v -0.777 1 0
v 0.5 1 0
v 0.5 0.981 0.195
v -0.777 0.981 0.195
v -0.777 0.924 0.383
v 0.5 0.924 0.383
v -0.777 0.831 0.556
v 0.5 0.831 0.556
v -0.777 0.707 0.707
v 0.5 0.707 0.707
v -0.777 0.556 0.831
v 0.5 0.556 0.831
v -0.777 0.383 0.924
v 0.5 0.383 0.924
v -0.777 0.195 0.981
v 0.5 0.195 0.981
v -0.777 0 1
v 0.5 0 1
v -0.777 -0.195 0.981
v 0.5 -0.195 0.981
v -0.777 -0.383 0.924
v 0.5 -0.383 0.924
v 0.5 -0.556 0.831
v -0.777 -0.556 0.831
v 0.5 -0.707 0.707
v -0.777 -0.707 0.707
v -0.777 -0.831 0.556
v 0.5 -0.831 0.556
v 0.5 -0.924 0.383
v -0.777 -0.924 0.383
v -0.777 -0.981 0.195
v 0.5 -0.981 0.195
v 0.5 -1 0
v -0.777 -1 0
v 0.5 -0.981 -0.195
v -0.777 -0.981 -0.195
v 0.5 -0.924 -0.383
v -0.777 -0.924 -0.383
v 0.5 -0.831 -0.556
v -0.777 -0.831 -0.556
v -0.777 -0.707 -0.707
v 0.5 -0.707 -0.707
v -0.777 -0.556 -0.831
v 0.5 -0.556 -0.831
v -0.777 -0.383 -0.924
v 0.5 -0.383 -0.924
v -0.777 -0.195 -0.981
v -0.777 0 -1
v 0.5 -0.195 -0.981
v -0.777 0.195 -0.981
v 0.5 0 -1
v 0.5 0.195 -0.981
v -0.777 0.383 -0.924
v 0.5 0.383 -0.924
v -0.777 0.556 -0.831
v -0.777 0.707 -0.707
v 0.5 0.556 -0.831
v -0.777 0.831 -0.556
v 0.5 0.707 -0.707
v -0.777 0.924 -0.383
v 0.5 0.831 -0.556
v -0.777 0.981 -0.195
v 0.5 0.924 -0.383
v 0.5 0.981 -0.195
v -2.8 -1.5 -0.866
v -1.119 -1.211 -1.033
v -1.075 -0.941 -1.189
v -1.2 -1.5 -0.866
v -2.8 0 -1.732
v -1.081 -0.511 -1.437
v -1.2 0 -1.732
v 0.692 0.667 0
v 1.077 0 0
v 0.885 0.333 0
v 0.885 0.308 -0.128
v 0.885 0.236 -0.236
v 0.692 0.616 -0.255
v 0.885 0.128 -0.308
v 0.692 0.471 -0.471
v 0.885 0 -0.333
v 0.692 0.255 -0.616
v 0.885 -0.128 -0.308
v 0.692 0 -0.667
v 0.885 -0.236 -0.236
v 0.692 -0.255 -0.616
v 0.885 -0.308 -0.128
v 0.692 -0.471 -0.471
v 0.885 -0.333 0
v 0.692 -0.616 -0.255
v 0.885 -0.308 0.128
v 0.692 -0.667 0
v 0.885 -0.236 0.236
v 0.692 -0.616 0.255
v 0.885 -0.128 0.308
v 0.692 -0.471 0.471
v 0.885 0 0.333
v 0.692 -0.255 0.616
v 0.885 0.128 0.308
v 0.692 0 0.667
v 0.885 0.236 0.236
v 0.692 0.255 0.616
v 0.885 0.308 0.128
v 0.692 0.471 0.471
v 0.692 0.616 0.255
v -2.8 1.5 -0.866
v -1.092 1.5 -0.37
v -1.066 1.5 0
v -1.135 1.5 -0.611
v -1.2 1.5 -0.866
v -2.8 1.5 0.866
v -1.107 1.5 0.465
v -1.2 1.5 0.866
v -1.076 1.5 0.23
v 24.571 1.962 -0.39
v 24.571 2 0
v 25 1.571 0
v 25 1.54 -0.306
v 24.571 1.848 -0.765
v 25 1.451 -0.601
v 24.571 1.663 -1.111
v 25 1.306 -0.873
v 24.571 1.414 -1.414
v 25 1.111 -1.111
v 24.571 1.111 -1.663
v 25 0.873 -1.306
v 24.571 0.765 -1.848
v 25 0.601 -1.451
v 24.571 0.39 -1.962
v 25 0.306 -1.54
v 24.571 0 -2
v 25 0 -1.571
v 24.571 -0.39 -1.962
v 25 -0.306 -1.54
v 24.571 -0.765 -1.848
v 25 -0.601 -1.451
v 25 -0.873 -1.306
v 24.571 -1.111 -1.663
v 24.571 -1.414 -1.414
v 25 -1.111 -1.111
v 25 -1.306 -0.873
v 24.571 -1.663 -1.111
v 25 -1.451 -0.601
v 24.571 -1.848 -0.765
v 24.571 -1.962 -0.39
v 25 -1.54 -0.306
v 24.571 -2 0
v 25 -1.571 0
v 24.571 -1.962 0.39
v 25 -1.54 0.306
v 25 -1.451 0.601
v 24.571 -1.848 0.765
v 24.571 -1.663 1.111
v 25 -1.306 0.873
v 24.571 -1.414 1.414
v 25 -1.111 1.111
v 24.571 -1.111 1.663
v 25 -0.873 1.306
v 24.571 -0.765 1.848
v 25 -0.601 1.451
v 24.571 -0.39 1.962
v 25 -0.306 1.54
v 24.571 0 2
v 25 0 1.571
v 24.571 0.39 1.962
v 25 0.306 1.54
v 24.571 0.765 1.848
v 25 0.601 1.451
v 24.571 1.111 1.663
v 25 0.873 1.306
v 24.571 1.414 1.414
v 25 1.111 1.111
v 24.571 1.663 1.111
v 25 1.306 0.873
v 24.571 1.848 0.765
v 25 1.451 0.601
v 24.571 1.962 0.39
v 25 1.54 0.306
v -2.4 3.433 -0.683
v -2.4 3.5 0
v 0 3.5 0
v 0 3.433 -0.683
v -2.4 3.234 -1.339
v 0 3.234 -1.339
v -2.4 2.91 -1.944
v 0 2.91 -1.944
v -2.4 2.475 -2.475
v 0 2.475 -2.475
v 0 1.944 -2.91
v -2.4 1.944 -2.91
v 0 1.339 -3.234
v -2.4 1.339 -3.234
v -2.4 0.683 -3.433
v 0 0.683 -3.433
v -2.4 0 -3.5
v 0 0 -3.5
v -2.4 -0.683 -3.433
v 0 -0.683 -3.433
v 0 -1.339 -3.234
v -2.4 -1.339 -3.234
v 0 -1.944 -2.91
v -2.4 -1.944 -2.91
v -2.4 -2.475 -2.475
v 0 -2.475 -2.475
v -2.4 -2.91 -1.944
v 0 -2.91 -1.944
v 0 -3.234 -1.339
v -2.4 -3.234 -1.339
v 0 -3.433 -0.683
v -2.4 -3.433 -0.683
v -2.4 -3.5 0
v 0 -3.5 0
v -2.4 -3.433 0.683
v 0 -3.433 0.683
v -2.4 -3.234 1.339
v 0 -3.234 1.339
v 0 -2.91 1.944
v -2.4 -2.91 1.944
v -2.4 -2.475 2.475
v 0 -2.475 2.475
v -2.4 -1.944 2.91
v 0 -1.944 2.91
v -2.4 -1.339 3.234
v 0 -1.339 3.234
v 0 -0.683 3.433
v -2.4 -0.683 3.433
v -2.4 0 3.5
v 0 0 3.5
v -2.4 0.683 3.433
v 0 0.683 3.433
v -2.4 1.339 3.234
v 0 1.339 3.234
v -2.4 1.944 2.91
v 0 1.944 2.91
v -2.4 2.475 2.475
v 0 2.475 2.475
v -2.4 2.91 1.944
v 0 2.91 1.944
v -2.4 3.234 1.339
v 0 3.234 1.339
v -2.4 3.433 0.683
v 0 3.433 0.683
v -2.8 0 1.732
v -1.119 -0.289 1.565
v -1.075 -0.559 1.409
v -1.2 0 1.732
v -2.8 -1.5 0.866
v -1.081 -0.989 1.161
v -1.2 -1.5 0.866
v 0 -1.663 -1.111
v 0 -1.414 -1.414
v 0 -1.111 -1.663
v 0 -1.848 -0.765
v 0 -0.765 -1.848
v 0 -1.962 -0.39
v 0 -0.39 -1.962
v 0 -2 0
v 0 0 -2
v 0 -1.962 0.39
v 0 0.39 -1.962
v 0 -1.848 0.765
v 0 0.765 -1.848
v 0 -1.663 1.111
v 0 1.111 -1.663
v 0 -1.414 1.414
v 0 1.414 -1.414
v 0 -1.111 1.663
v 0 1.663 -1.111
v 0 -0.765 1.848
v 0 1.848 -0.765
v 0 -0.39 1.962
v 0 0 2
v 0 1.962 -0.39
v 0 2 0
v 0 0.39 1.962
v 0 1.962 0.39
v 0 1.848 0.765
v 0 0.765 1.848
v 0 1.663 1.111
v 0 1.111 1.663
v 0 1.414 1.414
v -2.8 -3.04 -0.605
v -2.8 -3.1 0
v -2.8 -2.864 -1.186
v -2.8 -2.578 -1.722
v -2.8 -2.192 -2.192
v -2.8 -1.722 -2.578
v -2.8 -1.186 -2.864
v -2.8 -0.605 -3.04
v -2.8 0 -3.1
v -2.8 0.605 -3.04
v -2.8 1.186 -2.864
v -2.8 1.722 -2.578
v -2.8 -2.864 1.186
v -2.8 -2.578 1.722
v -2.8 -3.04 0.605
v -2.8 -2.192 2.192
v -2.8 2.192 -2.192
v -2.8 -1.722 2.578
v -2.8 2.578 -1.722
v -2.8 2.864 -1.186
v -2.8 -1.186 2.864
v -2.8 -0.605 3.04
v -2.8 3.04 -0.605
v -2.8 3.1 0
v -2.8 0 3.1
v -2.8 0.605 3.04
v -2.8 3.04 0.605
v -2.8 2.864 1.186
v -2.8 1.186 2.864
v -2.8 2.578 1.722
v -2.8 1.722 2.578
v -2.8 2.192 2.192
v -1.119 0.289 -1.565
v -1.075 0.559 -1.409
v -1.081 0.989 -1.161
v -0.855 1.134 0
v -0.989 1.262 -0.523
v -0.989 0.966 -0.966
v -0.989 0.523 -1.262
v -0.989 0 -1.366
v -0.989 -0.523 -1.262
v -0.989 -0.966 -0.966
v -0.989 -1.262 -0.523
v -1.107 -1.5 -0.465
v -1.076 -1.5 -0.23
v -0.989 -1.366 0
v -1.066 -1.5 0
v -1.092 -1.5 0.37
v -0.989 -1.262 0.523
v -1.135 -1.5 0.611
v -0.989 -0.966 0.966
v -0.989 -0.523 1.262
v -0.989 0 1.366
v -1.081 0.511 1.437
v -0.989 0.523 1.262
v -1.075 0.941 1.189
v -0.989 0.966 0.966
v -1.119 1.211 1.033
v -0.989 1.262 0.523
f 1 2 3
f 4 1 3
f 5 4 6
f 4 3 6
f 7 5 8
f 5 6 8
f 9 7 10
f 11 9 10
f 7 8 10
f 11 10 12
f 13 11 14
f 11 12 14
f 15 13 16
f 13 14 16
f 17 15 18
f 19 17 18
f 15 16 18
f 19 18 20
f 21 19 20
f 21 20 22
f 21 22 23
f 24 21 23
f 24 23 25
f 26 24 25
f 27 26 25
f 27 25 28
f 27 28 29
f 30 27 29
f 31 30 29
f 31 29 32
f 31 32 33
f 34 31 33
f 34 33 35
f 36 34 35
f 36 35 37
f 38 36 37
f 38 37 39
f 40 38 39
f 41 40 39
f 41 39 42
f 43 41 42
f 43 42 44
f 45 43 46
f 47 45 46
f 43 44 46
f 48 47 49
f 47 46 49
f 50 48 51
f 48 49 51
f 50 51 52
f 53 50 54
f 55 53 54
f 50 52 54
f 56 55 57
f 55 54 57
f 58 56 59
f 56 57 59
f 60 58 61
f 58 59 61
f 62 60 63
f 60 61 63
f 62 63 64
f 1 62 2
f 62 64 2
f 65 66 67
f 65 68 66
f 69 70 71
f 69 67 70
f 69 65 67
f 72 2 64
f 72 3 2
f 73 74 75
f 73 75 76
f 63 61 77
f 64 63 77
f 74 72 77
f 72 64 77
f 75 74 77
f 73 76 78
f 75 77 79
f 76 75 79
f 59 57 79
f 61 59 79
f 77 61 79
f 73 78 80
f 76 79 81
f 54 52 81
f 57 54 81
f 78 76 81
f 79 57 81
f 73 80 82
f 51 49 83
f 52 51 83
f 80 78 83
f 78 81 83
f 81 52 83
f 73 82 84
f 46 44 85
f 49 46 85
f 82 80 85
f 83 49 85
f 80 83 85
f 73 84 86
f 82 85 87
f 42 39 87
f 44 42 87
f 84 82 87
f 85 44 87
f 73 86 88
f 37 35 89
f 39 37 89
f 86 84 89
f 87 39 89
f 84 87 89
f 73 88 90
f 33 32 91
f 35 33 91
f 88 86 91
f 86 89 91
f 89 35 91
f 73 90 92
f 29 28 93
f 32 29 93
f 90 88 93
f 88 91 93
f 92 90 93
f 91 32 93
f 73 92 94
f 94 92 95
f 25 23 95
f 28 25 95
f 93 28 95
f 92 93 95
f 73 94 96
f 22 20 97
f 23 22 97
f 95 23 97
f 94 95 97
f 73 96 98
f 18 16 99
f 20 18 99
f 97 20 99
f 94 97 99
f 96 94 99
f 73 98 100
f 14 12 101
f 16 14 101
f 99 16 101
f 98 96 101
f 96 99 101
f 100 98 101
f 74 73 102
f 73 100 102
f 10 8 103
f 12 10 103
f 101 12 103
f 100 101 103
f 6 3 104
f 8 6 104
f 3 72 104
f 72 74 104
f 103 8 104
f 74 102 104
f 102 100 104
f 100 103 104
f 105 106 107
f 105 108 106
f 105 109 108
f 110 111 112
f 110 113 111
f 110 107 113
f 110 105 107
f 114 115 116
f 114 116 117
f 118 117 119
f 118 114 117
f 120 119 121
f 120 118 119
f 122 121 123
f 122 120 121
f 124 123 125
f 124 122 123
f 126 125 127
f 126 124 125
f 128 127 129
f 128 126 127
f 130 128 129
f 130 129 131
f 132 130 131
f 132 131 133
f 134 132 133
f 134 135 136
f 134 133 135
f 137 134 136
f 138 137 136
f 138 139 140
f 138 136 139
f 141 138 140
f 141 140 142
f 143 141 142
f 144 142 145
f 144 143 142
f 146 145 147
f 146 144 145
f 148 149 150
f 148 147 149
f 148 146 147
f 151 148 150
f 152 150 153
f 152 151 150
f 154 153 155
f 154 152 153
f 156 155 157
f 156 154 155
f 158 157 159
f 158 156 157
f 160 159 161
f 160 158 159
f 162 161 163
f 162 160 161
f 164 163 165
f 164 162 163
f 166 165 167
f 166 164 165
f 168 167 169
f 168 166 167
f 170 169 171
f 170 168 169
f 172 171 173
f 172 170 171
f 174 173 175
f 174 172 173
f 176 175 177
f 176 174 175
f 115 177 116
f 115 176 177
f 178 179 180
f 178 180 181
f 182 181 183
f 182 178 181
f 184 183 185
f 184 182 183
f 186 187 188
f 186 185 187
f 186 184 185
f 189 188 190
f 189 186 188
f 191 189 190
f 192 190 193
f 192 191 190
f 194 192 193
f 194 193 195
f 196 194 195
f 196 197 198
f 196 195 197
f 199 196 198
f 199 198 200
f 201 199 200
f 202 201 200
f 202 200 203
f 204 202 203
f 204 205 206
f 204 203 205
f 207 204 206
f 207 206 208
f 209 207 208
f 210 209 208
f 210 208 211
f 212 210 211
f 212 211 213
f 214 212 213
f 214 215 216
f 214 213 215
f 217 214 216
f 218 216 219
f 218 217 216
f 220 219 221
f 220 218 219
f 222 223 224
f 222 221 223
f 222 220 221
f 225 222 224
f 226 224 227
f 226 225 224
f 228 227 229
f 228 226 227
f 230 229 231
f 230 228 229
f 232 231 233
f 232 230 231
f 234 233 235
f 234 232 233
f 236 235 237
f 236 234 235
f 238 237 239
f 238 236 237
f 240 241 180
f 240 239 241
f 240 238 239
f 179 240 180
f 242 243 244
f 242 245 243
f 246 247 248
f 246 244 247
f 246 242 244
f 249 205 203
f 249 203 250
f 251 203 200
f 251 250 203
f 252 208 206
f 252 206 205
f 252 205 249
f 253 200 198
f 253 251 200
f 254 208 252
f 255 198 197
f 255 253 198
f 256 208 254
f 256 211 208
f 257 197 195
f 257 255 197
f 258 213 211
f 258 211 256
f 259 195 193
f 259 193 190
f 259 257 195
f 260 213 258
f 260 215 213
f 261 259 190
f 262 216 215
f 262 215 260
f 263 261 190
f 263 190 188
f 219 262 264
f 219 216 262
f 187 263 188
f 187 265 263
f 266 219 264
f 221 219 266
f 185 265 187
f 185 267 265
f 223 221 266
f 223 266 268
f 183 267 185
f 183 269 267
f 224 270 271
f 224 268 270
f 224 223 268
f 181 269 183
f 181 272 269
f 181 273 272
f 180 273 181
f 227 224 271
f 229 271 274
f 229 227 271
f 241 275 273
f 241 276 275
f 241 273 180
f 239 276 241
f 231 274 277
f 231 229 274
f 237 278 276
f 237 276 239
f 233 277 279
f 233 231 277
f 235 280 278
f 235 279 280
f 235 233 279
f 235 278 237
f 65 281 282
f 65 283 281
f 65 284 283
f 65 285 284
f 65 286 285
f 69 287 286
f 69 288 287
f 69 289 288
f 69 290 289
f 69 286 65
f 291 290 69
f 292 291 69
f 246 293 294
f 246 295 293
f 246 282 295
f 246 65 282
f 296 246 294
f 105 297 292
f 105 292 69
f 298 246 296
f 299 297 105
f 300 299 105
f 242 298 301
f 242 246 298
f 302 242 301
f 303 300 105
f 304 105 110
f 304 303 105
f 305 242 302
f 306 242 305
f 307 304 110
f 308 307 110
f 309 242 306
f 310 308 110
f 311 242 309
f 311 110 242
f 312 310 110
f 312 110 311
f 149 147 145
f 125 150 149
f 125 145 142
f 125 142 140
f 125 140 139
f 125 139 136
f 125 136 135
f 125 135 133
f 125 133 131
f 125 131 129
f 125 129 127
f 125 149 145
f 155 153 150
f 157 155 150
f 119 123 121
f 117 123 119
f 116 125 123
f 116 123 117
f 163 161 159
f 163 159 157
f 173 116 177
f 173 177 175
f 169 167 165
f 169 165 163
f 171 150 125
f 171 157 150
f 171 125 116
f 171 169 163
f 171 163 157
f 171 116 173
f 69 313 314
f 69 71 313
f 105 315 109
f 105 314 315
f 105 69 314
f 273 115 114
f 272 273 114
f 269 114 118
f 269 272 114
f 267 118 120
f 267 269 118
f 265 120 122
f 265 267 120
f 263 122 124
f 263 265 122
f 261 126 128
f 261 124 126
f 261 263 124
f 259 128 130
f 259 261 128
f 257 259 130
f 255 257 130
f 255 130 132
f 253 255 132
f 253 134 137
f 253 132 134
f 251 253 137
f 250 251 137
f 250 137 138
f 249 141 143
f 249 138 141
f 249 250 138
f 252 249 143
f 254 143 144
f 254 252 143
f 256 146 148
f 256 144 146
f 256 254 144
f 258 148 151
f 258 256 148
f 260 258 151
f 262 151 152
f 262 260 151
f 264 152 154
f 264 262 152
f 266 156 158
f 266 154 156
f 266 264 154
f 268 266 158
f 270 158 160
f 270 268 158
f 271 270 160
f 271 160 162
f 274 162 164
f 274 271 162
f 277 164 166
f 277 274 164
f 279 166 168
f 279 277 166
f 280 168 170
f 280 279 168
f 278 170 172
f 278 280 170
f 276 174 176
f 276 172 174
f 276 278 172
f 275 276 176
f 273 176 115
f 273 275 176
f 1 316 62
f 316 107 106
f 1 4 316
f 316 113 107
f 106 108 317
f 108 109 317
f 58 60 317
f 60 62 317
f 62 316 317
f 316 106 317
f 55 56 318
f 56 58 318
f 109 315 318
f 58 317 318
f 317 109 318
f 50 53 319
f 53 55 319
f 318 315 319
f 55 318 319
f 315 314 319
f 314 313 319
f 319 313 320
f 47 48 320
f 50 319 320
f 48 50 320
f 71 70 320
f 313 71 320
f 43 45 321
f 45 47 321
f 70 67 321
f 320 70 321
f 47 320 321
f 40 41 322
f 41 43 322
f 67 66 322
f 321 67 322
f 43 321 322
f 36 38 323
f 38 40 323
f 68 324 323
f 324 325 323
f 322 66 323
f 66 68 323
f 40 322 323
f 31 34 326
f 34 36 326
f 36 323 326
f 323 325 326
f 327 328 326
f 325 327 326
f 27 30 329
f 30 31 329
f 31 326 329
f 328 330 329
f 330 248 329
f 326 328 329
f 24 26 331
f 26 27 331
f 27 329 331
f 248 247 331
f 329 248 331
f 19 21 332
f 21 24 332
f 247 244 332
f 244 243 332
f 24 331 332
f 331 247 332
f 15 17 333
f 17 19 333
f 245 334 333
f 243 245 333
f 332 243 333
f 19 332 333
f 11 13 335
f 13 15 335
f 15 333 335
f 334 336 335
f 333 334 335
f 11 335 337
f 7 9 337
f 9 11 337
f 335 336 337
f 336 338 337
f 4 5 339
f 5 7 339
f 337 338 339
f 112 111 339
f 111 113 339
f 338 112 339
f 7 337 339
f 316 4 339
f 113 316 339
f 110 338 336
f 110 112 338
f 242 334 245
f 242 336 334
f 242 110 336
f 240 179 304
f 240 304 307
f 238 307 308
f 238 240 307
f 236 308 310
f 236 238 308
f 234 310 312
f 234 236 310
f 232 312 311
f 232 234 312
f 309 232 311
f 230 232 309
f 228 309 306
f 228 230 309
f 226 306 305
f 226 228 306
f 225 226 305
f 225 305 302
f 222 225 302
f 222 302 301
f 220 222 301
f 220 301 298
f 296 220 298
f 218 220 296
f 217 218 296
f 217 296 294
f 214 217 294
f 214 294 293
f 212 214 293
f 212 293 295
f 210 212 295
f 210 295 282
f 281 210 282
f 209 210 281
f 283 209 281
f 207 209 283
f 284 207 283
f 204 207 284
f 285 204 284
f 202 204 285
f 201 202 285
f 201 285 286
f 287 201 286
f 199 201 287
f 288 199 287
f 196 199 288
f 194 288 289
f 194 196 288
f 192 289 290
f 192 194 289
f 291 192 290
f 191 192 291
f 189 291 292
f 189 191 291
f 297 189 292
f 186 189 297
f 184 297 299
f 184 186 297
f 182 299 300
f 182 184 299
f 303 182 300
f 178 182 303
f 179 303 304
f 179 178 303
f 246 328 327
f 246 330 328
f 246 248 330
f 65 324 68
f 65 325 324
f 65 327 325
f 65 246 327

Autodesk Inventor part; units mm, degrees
ref_plane "YZ Plane" through (0, 0, 0) normal (1, 0, 0) x (0, 1, 0)
ref_plane "XZ Plane" through (0, 0, 0) normal (0, 1, 0) x (-1, 0, 0)
sketch "Sketch1" plane through (0, 0, 0) normal (0, 0, 1) x (1, 0, 0)
  line L0 (1.0774, 0) -> (25, 0)
  line L1 (25, 0) -> (25, 2)
  line L2 (25, 2) -> (0, 2)
  line L3 (0, 2) -> (0, 3.5)
  line L4 (0, 3.5) -> (-2.8, 3.5)
  line L5 (-2.8, 3.5) -> (-2.8, 1.7321)
  line L6 (-2.8, 1.7321) -> (-1.2, 1.7321)
  line L7 (-1.2, 1.7321) -> (-0.7774, 1)
  line L8 (-8.36, 0) -> (30.56, 0) projected
  line L9 (0, -0.7) -> (0, 4.2) projected
  line L10 (-0.7774, 1) -> (0.5, 1)
  line L11 (0.5, 1) -> (1.0774, 0)
  line L12 (-2.8, 1.7321) -> (-2.8, 0) construction
  line L13 (-2.8, 3.1) -> (-2.4, 3.5)
  dimension "d0" = 2.8
  dimension "d1" = 1.6
  dimension "d2" = 60
  dimension "d3" = 4
  dimension "d4" = 3.4641
  dimension "d5" = 7
  dimension "d15" = 3.3
  dimension "d16" = 2
  dimension "d17" = 25
  dimension "d32" = 45
  dimension "d33" = 0.4
revolve "Body" add sketch "Sketch1" angle 360 about axis through (1.0774, 0, 0) along (1, 0, 0) contours L11 L10 L9 L2 L1 L0 | L10 L7 L6 L5 L13 L4 L3 L9 | L13 L5 L4
revolve "Chamfer2" cut sketch "Sketch1" angle 360 about axis through (-10, 0, 0) along (1, 0, 0) contours L13 L5 L4
sketch "Sketch2" plane through (-2.8, 0, 0) normal (-1, 0, 0) x (0, 0, 1)
  circle A0 centre (0, 0) radius 1.7321 projected
  line L0 (0, -4.9) -> (0, 4.9) projected
  line L1 (-4.9, 0) -> (4.9, 0) projected
  line L2 (1.7321, 0) -> (0.866, -1.5)
  line L3 (0.866, -1.5) -> (-0.866, -1.5)
  line L4 (-0.866, -1.5) -> (-1.7321, 0)
  line L5 (-1.7321, 0) -> (-0.866, 1.5)
  line L6 (-0.866, 1.5) -> (0.866, 1.5)
  line L7 (0.866, 1.5) -> (1.7321, 0)
extrude "Slot" add sketch "Sketch2" against normal up to next contours L7 A0 | A0 L2 | L6 L0 A0 | A0 L0 L3 | L0 L6 A0 | A0 L3 L0 | L4 A0 | A0 L5
thread "Thread" size "M4x0.7" class "6g" standard "ISO Metric profile" length 14
chamfer "Chamfer1" distance 0.4294 distance2 0.4294 1 edges at (25, -2, 0) measured on face at (25, 0.6473, 0.1595)
ref_plane "Work Plane1" through (12.5, 0, 0) normal (0, 0.5, 0.866) x (1, 0, 0)
equation "\"d0\" = KOH"
equation "\"d1\" = INTI"
equation "\"d3\" = GD"
equation "\"d4\" = 1.1547 * SW"
equation "\"d5\" = KOD"
equation "\"d15\" = INFT"
equation "\"d16\" = SDT"
equation "\"d17\" = NLG"
equation "\"d33\" = Cham"
equation "\"d7\" = GEL"
equation "\"d9\" = -0.5 * SPD + 0.5 * GD"
equation "\"d12\" = GUL"
equation "\"GD\" = NND"
equation "\"NLG\" = 25"
equation "\"GEL\" = 14"
equation "\"KOD\" = 7"
equation "\"KOH\" = 2.8"
equation "\"GUL\" = 0.61345 * PTC"
equation "\"SW\" = 3"
equation "\"INTI\" = 1.6"
equation "\"SPD\" = NND - 1.2269 * PTC"
equation "\"SDT\" = 2"
equation "\"INFT\" = 3.3"
equation "\"Cham\" = 0.4"
equation "\"TOA\" = 30deg"
equation "\"GD1\" = THREADDIA - 1.2269 * PTC"
equation "\"THREADDIA\" = 4"
equation "\"BDM\" = NND"
equation "\"FAWI\" = 45deg"
equation "\"RR\" = 0.1 * NND"
equation "\"PTC\" = 0.7"
equation "\"NND\" = 4"
equation "\"FAWI1\" = 45deg"
equation "\"GAL\" = 0.61345 * PTC"
equation "\"E0\" = 1.155 * SW"
properties part number "DIN 6912 - M4 x 25" material "Steel, Mild"
